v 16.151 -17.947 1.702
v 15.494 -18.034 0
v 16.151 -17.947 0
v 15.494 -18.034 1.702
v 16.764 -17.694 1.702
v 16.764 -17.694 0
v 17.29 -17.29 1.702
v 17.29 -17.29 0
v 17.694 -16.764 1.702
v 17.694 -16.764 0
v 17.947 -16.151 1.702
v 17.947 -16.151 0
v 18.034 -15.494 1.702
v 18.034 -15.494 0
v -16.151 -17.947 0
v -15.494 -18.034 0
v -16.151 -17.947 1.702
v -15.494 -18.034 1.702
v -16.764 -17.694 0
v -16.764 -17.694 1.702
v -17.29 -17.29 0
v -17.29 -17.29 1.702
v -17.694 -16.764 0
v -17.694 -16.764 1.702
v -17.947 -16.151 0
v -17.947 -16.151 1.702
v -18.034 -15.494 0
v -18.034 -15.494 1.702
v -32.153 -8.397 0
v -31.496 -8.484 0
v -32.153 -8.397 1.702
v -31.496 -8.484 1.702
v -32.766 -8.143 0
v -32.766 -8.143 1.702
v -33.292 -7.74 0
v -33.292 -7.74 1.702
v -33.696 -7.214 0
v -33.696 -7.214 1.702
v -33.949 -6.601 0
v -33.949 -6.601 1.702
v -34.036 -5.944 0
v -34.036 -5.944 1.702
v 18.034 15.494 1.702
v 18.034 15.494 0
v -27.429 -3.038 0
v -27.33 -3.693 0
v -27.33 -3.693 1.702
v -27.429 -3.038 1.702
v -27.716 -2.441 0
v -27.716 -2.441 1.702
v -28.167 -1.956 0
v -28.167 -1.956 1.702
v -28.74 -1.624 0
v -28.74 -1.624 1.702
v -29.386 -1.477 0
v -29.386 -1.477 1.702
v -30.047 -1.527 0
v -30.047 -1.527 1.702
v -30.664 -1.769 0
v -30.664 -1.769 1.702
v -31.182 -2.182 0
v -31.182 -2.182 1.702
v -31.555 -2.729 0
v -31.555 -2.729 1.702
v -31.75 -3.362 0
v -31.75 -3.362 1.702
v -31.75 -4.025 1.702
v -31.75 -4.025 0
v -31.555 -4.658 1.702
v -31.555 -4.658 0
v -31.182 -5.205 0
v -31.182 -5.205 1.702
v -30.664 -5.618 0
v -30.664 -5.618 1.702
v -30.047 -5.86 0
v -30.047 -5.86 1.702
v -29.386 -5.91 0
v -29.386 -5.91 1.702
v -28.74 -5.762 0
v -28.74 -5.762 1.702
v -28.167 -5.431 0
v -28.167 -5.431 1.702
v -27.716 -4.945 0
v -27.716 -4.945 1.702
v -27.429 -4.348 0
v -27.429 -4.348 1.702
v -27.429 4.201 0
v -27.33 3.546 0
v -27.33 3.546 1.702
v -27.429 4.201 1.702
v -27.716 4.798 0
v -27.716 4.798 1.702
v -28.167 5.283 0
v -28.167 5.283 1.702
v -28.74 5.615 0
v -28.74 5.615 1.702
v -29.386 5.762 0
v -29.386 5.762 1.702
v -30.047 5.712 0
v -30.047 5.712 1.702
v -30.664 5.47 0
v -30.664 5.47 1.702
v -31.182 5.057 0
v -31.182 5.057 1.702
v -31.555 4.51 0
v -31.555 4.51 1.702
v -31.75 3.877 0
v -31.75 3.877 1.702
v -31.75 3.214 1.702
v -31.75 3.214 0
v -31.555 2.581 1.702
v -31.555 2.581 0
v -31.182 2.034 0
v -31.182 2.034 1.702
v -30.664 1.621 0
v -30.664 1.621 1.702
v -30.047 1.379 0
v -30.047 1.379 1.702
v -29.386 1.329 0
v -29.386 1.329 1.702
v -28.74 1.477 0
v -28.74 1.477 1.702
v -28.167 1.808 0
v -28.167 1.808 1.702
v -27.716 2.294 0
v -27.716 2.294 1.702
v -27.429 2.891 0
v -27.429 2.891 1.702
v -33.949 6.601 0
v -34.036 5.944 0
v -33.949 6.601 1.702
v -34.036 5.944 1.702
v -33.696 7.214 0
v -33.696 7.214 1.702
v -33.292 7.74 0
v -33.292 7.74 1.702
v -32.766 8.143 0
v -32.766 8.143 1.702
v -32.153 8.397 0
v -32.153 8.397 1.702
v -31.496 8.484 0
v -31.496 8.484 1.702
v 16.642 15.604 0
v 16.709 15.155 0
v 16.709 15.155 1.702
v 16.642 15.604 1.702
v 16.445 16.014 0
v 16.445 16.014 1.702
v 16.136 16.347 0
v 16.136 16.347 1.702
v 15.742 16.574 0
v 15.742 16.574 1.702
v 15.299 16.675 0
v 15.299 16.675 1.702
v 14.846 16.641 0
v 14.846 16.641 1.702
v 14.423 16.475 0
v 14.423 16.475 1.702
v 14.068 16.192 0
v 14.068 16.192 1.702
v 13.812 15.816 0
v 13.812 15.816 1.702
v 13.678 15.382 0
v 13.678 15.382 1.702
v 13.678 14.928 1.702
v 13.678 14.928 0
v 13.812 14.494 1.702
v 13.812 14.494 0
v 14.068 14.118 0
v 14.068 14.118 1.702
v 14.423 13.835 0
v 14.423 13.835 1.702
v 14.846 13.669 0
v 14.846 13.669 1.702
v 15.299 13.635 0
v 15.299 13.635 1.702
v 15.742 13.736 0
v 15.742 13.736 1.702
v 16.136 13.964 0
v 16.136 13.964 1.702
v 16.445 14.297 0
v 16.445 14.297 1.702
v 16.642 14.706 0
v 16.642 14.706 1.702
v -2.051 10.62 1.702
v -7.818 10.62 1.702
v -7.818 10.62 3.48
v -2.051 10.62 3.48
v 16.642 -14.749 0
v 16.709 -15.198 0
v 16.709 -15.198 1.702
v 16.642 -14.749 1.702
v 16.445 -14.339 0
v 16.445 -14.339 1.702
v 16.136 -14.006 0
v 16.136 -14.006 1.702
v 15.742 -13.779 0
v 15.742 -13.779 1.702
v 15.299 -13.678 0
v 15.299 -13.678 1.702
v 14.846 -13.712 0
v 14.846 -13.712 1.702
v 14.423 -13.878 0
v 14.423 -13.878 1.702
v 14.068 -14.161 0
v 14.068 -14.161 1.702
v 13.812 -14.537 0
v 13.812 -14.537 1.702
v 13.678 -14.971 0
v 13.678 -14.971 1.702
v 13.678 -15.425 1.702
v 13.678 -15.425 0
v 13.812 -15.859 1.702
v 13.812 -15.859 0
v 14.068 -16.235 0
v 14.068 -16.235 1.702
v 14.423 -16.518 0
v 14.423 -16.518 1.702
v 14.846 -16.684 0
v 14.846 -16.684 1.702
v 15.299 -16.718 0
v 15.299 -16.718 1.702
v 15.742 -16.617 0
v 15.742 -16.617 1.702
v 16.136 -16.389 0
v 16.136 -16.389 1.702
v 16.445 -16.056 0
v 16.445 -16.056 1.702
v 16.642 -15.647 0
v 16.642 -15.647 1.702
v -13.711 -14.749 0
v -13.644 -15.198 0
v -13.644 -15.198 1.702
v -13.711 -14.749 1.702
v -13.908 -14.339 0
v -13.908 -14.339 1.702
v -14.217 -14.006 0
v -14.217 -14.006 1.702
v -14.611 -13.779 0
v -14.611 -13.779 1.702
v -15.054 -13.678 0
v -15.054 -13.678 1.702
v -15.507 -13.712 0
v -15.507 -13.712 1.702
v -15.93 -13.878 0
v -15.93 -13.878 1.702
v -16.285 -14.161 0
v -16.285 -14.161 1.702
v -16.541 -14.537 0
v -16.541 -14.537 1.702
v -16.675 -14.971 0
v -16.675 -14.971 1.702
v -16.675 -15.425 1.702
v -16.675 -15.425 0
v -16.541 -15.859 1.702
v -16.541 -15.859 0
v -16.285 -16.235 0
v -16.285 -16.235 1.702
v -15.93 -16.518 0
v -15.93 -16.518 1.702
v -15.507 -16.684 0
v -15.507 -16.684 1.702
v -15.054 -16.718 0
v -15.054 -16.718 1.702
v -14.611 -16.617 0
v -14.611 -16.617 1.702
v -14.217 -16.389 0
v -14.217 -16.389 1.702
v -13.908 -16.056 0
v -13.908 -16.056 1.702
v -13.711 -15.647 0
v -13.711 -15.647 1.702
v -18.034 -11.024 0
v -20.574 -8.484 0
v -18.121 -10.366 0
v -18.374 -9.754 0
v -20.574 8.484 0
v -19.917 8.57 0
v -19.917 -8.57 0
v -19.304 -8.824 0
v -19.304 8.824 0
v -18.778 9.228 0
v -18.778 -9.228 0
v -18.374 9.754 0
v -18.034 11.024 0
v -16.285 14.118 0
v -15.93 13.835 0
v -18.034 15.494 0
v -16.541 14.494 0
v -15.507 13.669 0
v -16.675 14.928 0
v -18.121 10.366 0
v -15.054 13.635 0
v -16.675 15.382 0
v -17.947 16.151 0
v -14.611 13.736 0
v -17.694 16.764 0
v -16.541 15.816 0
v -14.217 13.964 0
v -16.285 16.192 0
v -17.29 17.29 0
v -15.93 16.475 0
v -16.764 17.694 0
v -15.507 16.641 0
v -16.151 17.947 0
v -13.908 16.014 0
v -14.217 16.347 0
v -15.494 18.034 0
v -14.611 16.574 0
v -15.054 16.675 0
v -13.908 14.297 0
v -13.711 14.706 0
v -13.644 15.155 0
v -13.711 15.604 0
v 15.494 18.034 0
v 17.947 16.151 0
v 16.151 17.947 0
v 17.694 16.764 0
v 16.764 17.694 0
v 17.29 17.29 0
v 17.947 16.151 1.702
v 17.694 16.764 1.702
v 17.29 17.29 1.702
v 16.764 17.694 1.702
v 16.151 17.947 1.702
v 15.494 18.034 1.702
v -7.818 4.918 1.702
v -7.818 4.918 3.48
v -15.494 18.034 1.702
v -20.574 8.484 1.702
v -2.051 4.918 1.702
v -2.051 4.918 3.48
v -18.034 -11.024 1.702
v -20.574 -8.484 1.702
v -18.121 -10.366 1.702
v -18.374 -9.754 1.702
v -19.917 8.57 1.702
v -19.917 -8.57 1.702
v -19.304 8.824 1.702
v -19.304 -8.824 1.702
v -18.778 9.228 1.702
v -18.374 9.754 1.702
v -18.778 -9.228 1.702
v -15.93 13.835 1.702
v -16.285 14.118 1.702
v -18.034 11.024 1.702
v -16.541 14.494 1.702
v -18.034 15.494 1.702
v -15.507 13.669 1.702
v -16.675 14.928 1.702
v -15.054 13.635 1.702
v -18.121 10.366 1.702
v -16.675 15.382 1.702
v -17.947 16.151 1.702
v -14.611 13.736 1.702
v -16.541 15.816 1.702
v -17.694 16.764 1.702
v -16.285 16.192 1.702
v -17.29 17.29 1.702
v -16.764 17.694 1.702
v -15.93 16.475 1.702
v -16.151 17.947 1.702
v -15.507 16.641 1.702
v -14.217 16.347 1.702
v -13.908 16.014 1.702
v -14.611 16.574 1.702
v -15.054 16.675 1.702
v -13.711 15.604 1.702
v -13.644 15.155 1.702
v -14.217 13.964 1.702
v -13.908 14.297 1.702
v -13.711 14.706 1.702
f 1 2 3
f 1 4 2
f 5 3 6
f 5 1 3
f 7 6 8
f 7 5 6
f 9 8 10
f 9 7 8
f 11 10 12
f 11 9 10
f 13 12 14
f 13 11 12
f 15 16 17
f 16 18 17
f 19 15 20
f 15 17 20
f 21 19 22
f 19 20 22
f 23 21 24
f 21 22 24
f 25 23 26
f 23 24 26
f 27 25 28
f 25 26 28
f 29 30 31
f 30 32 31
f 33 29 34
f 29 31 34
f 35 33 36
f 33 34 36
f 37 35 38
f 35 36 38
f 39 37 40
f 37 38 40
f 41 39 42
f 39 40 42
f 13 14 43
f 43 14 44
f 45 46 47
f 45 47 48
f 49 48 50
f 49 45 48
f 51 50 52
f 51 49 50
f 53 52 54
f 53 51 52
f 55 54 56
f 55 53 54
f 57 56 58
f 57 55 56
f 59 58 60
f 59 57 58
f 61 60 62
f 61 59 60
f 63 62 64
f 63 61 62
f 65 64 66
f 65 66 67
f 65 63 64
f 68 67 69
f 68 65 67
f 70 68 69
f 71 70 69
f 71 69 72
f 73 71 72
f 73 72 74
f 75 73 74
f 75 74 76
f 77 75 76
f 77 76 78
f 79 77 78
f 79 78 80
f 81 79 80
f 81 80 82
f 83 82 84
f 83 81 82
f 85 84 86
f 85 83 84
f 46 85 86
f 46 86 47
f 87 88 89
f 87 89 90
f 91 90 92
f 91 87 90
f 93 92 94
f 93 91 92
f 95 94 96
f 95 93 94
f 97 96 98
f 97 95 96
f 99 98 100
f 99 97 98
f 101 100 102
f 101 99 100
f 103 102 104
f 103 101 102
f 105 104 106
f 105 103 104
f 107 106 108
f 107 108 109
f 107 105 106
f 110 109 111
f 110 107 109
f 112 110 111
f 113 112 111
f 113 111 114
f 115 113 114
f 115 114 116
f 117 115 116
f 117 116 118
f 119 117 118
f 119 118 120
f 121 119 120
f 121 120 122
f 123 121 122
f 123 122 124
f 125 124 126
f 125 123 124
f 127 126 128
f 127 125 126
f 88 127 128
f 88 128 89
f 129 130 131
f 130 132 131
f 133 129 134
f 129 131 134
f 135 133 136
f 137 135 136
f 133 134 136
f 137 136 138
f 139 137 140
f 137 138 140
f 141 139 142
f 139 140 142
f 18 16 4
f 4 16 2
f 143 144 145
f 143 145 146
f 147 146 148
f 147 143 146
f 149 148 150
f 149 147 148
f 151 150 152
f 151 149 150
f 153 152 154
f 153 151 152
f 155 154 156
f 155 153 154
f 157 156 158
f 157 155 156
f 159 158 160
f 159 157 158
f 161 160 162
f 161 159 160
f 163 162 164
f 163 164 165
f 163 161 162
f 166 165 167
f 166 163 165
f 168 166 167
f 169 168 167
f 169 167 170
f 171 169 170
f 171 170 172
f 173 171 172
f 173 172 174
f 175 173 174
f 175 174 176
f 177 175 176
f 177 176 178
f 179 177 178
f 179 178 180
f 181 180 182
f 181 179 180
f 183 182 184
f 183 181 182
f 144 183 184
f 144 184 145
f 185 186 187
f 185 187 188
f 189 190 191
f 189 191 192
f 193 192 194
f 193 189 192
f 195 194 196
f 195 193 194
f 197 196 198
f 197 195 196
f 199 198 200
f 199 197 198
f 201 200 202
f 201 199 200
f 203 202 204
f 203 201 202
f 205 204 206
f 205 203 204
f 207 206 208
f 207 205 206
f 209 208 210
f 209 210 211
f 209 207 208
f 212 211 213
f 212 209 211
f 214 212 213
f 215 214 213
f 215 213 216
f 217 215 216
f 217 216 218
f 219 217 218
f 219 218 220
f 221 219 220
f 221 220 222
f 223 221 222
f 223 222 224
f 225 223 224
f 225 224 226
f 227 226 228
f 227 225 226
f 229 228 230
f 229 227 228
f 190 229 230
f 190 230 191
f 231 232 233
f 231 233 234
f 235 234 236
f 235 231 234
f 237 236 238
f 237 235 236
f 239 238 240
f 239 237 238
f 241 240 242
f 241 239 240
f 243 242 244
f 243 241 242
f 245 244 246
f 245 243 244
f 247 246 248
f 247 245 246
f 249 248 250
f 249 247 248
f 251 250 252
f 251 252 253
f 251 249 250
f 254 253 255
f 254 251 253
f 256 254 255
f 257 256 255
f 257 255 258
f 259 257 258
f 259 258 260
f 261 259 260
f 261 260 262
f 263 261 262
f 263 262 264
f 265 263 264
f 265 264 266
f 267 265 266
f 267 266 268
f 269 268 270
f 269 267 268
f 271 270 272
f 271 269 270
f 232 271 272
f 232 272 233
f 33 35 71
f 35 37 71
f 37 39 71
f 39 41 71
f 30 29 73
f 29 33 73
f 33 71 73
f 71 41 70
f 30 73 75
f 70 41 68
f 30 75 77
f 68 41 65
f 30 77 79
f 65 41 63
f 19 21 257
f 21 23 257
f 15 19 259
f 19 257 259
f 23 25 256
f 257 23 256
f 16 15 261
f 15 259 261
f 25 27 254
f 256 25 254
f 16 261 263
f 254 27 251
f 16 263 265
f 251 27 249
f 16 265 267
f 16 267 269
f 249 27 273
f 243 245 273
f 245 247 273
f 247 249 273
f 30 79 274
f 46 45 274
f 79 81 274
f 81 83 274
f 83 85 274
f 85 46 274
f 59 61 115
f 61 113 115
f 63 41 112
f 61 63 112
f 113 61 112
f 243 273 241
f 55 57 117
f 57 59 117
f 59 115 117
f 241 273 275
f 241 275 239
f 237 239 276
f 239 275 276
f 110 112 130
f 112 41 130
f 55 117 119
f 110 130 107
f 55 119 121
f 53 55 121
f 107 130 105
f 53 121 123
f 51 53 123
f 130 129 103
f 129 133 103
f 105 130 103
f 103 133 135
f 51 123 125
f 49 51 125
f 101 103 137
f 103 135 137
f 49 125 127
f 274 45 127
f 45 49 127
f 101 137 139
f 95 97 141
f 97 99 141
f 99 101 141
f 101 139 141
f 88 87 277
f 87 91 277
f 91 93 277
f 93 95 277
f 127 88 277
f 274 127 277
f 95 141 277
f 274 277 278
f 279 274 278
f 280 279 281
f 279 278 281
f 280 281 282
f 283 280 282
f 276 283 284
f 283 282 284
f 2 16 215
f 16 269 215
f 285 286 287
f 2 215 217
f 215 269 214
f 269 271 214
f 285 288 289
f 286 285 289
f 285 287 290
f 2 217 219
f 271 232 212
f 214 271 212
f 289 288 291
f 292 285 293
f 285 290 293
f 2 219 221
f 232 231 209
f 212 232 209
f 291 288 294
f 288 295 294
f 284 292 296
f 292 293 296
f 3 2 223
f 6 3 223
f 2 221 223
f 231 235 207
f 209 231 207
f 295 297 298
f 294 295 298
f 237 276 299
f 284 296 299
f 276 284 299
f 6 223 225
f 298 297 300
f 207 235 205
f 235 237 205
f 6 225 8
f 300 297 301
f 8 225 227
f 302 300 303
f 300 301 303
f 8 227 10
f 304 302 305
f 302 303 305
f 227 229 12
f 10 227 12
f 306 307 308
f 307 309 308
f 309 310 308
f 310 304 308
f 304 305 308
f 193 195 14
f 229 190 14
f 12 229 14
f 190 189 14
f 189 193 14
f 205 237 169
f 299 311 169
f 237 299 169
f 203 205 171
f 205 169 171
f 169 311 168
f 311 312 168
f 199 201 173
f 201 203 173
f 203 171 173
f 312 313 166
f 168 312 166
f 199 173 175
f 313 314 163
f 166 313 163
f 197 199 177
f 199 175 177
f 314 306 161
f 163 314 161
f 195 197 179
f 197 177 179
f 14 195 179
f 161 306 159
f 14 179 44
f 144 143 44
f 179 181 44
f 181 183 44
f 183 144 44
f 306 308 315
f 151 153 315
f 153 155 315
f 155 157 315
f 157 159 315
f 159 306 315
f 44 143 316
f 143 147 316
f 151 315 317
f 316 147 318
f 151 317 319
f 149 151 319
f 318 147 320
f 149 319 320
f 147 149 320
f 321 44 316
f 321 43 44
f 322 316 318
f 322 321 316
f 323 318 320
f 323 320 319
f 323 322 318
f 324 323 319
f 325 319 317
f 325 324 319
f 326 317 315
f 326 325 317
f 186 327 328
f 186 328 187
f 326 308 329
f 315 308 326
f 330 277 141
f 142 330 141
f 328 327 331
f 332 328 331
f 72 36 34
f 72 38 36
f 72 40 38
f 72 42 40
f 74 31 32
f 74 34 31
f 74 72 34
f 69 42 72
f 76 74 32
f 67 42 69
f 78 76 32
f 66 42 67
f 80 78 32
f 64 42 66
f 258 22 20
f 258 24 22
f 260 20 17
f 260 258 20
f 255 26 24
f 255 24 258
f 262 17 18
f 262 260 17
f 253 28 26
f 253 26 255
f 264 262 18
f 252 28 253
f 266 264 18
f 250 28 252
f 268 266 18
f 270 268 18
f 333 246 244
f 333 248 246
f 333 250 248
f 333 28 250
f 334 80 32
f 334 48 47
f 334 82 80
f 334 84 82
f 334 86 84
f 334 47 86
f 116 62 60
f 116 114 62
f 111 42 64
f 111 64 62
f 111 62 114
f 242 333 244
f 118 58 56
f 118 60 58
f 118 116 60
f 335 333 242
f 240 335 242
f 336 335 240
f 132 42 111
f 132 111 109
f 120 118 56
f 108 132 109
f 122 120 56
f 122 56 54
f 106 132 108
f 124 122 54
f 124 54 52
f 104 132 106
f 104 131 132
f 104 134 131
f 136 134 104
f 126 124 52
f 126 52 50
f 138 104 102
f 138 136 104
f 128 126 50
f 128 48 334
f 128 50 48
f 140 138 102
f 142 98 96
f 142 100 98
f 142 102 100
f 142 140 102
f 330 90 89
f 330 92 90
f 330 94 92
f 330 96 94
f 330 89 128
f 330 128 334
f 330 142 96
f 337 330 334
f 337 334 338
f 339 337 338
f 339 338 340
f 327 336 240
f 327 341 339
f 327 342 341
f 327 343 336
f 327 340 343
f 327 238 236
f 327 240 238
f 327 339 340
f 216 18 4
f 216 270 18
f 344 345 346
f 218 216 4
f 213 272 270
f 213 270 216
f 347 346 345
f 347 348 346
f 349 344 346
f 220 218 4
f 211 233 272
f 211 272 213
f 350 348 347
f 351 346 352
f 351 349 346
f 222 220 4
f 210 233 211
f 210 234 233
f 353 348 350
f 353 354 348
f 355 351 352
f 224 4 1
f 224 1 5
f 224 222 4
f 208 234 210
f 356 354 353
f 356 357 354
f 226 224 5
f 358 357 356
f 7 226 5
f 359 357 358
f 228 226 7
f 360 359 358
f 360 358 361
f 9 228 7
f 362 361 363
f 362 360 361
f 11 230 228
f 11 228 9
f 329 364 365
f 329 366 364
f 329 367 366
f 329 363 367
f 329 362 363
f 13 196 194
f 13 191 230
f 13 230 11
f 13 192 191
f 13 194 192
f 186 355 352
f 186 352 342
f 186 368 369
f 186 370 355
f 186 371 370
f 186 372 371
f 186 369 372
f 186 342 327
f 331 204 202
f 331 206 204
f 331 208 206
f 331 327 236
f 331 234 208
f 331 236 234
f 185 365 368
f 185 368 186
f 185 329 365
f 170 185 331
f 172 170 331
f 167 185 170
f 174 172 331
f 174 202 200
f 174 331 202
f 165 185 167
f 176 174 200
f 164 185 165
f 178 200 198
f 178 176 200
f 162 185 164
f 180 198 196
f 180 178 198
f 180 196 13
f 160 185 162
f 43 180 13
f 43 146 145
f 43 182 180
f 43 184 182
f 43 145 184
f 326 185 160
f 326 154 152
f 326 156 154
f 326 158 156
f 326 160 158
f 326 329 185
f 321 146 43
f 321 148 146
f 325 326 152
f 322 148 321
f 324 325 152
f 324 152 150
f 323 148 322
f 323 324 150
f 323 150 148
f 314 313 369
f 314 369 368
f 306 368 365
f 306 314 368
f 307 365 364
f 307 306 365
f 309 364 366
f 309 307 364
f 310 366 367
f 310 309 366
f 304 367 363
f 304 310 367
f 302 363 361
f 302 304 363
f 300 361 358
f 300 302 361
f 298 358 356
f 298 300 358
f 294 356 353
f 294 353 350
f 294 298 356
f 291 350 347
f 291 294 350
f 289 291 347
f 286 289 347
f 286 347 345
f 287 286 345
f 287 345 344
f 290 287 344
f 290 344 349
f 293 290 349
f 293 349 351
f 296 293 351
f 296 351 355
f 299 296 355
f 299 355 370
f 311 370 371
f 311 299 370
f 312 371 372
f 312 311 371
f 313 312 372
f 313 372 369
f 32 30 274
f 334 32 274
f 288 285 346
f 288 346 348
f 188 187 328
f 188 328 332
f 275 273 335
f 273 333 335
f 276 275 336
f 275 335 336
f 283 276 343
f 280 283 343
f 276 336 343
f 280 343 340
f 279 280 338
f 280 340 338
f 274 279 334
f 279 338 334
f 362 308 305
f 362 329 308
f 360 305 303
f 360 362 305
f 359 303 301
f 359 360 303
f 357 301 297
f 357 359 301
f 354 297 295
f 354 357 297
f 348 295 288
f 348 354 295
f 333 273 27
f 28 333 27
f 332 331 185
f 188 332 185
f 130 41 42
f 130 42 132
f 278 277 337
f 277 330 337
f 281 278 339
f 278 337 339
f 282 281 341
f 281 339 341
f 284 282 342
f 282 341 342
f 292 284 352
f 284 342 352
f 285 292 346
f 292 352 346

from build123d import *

# Parameters (mm, degrees)
F0_W     = 36.068
F0_H     = 9.5504
F0_R     = 1.524
F0_H_2   = 16.9672
F0_W_2   = 16.002
F0_R_2   = 2.2225
F1_DEPTH = 1.7018
F2_R     = 2.54
F3_R     = 2.54
F4_W     = 5.766904
F4_H     = 5.702107
F5_DEPTH = 1.778


with BuildPart() as f1:
    # F0 (on Top) → F1 (new body)
    with BuildSketch(Plane.XY):
        with Locations((0, -13.2588)):
            Rectangle(F0_W, F0_H)
        with Locations((-15.167683, -15.197962)):
            Circle(F0_R, mode=Mode.SUBTRACT)
        with Locations((15.185317, -15.197962)):
            Circle(F0_R, mode=Mode.SUBTRACT)
        Rectangle(F0_W, F0_H_2)
        with Locations((-26.035, 0)):
            Rectangle(F0_W_2, F0_H_2)
        with Locations((-29.552327, -3.693333)):
            Circle(F0_R_2, mode=Mode.SUBTRACT)
        with Locations((-29.552327, 3.545667)):
            Circle(F0_R_2, mode=Mode.SUBTRACT)
        with Locations((0, 13.2588)):
            Rectangle(F0_W, F0_H)
        with Locations((-15.167683, 15.155038)):
            Circle(F0_R, mode=Mode.SUBTRACT)
        with Locations((15.185317, 15.155038)):
            Circle(F0_R, mode=Mode.SUBTRACT)
    extrude(amount=F1_DEPTH)

    # F2
    f2_edges = [f1.edges().sort_by_distance(p)[0] for p in [
        (-18.034, 18.034, 0.8509),
        (-18.034, -18.034, 0.8509),
        (18.034, -18.034, 0.8509),
        (18.034, 18.034, 0.8509),
    ]]
    fillet(f2_edges, radius=F2_R)

    # F3
    f3_edges = [f1.edges().sort_by_distance(p)[0] for p in [
        (-18.034, 8.4836, 0.8509),
        (-18.034, -8.4836, 0.8509),
        (-34.036, -8.4836, 0.8509),
        (-34.036, 8.4836, 0.8509),
    ]]
    fillet(f3_edges, radius=F3_R)

    # F4 (on face) → F5 (join)
    with BuildSketch(Plane.XY.offset(1.7018)):
        with Locations((-4.934564, 7.768857)):
            Rectangle(F4_W, F4_H)
    extrude(amount=F5_DEPTH)


solid = f1.part
